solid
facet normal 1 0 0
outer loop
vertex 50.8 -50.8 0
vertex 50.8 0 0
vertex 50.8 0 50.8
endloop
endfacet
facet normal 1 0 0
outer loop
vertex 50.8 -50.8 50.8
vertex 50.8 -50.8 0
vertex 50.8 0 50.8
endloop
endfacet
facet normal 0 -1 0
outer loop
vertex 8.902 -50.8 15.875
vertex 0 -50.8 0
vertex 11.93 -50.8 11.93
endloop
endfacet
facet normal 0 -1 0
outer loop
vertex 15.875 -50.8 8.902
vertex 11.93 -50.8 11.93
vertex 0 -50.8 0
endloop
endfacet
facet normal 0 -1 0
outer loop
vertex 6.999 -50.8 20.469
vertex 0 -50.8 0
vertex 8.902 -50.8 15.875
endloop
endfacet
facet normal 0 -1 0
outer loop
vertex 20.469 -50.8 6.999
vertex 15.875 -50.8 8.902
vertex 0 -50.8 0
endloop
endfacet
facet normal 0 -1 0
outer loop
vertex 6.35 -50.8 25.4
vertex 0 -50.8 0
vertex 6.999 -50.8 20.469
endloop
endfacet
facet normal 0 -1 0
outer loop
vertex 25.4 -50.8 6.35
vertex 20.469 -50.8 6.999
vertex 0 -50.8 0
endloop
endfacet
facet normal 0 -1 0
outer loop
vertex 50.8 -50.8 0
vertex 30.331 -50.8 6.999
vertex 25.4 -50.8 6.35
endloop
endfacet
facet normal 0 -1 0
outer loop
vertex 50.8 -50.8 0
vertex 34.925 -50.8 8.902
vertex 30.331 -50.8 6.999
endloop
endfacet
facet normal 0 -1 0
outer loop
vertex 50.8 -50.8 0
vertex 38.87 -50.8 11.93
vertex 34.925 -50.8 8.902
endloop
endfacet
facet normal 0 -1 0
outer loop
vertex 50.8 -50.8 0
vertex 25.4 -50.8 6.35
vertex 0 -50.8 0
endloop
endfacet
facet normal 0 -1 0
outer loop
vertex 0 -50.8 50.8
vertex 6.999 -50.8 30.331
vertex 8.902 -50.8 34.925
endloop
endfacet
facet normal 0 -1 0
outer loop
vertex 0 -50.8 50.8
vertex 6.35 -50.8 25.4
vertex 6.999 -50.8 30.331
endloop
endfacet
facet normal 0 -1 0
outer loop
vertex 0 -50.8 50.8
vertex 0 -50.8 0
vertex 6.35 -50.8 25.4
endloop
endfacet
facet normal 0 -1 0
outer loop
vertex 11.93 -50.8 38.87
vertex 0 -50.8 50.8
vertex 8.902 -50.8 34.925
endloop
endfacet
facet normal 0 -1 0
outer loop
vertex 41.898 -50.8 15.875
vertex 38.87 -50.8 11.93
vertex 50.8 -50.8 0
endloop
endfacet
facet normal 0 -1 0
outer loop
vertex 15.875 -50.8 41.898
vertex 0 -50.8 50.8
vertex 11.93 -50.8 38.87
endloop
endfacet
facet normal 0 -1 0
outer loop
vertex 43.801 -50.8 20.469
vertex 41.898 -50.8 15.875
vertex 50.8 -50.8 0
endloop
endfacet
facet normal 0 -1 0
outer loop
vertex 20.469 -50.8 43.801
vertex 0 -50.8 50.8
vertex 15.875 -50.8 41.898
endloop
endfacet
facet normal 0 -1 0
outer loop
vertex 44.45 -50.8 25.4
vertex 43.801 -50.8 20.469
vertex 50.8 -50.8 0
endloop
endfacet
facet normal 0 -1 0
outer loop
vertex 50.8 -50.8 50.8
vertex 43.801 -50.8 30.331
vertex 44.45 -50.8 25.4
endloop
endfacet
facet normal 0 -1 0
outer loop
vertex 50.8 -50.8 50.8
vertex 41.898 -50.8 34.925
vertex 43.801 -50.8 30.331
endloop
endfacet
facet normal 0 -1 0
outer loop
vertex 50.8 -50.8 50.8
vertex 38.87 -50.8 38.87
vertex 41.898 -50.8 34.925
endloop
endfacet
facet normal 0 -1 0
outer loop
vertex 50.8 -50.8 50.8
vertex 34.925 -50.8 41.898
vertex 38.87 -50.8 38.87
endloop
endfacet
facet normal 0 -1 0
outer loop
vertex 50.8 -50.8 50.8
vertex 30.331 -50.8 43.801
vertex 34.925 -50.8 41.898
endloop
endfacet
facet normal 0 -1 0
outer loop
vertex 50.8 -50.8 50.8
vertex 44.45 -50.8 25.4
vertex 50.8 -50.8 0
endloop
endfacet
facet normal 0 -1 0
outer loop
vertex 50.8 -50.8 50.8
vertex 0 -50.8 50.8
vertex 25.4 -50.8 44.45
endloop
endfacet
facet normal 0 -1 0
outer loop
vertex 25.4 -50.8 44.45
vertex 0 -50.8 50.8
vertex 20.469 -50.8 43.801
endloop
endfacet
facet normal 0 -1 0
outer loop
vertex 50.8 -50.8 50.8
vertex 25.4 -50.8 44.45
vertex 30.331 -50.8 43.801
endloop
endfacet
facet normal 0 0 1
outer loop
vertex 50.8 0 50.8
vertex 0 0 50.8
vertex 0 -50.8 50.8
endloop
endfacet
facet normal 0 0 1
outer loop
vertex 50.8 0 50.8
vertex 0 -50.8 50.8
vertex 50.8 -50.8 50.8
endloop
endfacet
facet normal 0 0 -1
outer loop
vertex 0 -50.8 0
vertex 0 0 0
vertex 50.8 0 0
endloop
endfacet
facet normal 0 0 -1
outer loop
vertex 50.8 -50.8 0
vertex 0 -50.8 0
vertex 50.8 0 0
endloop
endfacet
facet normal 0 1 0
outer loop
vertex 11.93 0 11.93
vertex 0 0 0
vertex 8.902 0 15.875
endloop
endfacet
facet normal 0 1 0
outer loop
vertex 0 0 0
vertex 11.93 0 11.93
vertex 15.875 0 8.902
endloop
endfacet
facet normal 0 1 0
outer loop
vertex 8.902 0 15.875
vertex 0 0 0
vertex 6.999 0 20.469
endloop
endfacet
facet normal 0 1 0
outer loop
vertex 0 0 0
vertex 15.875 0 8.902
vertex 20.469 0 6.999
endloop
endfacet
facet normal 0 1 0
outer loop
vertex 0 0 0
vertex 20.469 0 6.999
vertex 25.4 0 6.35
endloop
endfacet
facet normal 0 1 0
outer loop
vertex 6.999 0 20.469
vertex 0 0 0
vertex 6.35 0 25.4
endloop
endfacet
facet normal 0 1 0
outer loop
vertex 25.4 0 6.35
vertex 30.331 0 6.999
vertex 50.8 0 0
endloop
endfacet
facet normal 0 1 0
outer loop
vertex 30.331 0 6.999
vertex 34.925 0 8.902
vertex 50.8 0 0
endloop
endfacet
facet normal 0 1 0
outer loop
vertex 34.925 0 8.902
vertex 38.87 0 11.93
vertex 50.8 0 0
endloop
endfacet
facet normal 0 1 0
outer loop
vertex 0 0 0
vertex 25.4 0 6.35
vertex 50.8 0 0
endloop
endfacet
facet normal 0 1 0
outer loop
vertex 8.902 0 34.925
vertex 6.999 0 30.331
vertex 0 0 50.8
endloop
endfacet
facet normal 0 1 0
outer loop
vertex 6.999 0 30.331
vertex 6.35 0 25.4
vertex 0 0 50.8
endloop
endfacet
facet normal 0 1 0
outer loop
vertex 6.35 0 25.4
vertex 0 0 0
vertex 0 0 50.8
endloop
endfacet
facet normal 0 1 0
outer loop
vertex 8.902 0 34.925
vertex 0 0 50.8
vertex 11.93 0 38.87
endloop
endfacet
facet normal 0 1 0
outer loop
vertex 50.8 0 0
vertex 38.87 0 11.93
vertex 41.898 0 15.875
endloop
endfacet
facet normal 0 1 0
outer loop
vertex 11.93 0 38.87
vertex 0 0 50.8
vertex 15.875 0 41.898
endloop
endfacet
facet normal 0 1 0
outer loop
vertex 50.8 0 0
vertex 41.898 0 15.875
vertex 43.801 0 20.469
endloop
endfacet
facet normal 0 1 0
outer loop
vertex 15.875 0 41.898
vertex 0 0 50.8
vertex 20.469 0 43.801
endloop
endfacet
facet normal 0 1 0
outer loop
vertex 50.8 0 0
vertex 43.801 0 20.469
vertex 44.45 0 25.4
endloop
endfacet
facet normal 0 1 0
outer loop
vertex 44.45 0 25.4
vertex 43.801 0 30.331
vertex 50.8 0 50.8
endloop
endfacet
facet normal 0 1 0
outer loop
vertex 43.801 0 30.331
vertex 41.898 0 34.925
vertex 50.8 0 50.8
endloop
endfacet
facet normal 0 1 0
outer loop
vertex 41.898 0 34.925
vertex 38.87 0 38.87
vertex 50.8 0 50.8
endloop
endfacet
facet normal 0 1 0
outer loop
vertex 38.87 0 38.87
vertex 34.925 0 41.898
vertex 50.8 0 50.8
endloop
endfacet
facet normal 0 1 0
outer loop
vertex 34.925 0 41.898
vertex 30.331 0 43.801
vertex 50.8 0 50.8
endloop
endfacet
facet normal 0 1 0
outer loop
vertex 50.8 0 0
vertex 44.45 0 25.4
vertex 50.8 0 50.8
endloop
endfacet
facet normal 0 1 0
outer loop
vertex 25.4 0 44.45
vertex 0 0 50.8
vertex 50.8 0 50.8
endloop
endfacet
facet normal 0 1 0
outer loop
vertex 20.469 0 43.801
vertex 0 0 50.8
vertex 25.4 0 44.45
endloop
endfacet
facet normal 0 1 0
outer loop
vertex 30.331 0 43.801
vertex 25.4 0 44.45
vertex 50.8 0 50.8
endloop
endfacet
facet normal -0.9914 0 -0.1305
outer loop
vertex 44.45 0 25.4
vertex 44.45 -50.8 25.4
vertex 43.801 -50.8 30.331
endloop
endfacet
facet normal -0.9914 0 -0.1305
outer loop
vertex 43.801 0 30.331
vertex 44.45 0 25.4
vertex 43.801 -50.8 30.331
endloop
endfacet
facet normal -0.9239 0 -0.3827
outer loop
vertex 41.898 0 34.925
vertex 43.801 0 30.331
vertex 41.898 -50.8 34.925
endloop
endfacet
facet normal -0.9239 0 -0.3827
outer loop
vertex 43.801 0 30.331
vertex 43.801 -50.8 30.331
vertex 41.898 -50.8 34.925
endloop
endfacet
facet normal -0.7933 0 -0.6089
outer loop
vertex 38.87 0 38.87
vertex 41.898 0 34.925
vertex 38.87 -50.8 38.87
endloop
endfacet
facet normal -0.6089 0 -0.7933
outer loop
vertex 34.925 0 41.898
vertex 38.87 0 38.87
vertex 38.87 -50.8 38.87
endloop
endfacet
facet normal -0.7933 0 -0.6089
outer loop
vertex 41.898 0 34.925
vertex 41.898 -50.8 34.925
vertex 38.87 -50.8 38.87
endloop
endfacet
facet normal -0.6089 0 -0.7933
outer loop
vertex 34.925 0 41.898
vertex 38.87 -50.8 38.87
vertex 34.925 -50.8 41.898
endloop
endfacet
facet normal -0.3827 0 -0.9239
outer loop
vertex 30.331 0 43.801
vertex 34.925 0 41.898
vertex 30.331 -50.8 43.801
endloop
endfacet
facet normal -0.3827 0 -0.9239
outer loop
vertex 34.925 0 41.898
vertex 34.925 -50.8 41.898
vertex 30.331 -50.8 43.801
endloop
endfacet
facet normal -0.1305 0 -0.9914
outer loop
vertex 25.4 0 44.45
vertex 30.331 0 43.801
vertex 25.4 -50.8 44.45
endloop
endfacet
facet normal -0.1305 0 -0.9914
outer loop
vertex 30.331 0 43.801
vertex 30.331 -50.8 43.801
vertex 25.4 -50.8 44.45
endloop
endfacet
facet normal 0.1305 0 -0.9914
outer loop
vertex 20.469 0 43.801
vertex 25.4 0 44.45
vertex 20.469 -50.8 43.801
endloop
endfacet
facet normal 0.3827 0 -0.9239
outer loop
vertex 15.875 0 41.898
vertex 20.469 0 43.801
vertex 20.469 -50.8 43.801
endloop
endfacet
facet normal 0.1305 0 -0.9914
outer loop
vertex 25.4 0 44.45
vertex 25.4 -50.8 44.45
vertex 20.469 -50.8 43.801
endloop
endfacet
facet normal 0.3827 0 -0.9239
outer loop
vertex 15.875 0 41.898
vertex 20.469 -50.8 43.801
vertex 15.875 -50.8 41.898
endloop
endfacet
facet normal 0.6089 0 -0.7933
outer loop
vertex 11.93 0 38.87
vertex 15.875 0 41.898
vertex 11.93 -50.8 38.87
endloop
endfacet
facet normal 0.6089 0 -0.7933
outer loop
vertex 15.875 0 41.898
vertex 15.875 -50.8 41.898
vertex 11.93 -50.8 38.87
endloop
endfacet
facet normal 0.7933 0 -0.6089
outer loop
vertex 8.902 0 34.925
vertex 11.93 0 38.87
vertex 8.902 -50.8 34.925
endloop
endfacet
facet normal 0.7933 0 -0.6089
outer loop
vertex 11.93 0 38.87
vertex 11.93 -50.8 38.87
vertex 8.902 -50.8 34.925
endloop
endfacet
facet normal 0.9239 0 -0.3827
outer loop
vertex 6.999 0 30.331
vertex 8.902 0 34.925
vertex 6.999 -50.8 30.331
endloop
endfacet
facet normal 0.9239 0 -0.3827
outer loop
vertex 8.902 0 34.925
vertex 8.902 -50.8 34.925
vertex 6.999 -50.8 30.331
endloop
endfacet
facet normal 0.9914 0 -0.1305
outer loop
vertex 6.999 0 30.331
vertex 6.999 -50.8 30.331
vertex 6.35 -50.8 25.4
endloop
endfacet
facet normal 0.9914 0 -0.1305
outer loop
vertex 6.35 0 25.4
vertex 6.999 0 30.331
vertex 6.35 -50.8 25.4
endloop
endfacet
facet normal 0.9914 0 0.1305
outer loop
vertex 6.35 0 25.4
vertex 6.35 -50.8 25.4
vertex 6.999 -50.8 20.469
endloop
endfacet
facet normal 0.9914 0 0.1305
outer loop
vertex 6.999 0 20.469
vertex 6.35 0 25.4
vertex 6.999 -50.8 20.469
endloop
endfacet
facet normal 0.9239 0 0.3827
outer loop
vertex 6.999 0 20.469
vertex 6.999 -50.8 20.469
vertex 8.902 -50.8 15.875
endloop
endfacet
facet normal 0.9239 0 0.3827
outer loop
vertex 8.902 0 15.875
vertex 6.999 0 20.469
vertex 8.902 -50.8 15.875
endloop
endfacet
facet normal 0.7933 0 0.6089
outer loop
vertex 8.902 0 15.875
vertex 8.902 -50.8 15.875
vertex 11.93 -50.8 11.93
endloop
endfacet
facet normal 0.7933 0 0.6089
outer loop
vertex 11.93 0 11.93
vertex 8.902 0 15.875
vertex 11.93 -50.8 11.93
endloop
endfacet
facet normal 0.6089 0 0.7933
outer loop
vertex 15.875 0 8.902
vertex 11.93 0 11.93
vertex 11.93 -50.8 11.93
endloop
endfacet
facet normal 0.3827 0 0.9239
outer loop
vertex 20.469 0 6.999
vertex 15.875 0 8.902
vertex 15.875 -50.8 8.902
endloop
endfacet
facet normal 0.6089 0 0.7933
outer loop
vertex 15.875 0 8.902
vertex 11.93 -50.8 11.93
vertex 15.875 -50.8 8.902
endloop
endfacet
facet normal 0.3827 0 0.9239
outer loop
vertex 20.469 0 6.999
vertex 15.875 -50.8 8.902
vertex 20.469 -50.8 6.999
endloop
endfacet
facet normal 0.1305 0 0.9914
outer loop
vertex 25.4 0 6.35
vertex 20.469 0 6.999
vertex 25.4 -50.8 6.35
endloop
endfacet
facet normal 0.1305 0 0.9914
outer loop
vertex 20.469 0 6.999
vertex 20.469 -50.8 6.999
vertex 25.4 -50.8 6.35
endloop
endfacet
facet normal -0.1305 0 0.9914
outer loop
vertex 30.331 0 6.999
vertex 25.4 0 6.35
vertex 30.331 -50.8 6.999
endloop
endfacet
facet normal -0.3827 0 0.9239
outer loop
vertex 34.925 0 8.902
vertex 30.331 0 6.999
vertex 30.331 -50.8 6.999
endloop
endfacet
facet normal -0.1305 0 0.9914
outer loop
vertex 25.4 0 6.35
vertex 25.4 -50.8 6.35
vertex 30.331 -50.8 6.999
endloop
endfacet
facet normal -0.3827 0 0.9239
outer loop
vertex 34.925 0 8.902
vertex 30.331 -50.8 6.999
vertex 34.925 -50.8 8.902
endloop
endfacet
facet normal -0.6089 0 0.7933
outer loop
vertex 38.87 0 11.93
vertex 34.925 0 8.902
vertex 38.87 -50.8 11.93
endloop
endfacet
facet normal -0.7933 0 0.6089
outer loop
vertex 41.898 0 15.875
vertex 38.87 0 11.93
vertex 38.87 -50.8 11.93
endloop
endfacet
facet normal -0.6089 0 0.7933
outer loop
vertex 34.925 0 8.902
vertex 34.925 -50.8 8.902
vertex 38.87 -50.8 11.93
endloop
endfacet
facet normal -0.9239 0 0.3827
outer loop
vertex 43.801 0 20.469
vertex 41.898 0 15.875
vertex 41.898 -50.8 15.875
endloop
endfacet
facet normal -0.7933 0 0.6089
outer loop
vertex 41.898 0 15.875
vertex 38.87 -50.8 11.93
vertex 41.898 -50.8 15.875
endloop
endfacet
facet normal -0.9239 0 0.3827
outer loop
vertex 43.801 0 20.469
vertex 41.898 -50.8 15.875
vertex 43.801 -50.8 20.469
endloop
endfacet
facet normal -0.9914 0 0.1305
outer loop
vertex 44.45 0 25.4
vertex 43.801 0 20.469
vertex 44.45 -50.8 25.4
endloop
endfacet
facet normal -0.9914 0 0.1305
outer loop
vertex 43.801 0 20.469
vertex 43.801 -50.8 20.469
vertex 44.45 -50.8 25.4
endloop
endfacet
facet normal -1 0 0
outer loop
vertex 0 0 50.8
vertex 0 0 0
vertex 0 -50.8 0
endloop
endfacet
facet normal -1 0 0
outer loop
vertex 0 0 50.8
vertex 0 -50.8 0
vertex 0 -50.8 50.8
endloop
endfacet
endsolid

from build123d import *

# Parameters (mm, degrees)
F0_W     = 50.8
F0_H     = 50.8
F1_DEPTH = 50.8
F2_R     = 15.755005
F3_DEPTH = 50.8
F4_R     = 19.05
F5_DEPTH = 50.8


with BuildPart() as f1:
    # F0 (on Front) → F1 (new body)
    with BuildSketch(Plane.XZ):
        with Locations((25.4, 25.4)):
            Rectangle(F0_W, F0_H)
    extrude(amount=F1_DEPTH)

    # F2 (on face) → F3 (cut)
    with BuildSketch(Plane.XZ.offset(50.8)):
        with Locations((24.034012, 24.344128)):
            Circle(F2_R)
    extrude(amount=F3_DEPTH, mode=Mode.SUBTRACT)

    # F4 (on face) → F5 (cut)
    with BuildSketch(Plane.XZ.offset(50.8)):
        with Locations((25.4, 25.4)):
            Circle(F4_R)
    extrude(amount=-F5_DEPTH, mode=Mode.SUBTRACT)


solid = f1.part
